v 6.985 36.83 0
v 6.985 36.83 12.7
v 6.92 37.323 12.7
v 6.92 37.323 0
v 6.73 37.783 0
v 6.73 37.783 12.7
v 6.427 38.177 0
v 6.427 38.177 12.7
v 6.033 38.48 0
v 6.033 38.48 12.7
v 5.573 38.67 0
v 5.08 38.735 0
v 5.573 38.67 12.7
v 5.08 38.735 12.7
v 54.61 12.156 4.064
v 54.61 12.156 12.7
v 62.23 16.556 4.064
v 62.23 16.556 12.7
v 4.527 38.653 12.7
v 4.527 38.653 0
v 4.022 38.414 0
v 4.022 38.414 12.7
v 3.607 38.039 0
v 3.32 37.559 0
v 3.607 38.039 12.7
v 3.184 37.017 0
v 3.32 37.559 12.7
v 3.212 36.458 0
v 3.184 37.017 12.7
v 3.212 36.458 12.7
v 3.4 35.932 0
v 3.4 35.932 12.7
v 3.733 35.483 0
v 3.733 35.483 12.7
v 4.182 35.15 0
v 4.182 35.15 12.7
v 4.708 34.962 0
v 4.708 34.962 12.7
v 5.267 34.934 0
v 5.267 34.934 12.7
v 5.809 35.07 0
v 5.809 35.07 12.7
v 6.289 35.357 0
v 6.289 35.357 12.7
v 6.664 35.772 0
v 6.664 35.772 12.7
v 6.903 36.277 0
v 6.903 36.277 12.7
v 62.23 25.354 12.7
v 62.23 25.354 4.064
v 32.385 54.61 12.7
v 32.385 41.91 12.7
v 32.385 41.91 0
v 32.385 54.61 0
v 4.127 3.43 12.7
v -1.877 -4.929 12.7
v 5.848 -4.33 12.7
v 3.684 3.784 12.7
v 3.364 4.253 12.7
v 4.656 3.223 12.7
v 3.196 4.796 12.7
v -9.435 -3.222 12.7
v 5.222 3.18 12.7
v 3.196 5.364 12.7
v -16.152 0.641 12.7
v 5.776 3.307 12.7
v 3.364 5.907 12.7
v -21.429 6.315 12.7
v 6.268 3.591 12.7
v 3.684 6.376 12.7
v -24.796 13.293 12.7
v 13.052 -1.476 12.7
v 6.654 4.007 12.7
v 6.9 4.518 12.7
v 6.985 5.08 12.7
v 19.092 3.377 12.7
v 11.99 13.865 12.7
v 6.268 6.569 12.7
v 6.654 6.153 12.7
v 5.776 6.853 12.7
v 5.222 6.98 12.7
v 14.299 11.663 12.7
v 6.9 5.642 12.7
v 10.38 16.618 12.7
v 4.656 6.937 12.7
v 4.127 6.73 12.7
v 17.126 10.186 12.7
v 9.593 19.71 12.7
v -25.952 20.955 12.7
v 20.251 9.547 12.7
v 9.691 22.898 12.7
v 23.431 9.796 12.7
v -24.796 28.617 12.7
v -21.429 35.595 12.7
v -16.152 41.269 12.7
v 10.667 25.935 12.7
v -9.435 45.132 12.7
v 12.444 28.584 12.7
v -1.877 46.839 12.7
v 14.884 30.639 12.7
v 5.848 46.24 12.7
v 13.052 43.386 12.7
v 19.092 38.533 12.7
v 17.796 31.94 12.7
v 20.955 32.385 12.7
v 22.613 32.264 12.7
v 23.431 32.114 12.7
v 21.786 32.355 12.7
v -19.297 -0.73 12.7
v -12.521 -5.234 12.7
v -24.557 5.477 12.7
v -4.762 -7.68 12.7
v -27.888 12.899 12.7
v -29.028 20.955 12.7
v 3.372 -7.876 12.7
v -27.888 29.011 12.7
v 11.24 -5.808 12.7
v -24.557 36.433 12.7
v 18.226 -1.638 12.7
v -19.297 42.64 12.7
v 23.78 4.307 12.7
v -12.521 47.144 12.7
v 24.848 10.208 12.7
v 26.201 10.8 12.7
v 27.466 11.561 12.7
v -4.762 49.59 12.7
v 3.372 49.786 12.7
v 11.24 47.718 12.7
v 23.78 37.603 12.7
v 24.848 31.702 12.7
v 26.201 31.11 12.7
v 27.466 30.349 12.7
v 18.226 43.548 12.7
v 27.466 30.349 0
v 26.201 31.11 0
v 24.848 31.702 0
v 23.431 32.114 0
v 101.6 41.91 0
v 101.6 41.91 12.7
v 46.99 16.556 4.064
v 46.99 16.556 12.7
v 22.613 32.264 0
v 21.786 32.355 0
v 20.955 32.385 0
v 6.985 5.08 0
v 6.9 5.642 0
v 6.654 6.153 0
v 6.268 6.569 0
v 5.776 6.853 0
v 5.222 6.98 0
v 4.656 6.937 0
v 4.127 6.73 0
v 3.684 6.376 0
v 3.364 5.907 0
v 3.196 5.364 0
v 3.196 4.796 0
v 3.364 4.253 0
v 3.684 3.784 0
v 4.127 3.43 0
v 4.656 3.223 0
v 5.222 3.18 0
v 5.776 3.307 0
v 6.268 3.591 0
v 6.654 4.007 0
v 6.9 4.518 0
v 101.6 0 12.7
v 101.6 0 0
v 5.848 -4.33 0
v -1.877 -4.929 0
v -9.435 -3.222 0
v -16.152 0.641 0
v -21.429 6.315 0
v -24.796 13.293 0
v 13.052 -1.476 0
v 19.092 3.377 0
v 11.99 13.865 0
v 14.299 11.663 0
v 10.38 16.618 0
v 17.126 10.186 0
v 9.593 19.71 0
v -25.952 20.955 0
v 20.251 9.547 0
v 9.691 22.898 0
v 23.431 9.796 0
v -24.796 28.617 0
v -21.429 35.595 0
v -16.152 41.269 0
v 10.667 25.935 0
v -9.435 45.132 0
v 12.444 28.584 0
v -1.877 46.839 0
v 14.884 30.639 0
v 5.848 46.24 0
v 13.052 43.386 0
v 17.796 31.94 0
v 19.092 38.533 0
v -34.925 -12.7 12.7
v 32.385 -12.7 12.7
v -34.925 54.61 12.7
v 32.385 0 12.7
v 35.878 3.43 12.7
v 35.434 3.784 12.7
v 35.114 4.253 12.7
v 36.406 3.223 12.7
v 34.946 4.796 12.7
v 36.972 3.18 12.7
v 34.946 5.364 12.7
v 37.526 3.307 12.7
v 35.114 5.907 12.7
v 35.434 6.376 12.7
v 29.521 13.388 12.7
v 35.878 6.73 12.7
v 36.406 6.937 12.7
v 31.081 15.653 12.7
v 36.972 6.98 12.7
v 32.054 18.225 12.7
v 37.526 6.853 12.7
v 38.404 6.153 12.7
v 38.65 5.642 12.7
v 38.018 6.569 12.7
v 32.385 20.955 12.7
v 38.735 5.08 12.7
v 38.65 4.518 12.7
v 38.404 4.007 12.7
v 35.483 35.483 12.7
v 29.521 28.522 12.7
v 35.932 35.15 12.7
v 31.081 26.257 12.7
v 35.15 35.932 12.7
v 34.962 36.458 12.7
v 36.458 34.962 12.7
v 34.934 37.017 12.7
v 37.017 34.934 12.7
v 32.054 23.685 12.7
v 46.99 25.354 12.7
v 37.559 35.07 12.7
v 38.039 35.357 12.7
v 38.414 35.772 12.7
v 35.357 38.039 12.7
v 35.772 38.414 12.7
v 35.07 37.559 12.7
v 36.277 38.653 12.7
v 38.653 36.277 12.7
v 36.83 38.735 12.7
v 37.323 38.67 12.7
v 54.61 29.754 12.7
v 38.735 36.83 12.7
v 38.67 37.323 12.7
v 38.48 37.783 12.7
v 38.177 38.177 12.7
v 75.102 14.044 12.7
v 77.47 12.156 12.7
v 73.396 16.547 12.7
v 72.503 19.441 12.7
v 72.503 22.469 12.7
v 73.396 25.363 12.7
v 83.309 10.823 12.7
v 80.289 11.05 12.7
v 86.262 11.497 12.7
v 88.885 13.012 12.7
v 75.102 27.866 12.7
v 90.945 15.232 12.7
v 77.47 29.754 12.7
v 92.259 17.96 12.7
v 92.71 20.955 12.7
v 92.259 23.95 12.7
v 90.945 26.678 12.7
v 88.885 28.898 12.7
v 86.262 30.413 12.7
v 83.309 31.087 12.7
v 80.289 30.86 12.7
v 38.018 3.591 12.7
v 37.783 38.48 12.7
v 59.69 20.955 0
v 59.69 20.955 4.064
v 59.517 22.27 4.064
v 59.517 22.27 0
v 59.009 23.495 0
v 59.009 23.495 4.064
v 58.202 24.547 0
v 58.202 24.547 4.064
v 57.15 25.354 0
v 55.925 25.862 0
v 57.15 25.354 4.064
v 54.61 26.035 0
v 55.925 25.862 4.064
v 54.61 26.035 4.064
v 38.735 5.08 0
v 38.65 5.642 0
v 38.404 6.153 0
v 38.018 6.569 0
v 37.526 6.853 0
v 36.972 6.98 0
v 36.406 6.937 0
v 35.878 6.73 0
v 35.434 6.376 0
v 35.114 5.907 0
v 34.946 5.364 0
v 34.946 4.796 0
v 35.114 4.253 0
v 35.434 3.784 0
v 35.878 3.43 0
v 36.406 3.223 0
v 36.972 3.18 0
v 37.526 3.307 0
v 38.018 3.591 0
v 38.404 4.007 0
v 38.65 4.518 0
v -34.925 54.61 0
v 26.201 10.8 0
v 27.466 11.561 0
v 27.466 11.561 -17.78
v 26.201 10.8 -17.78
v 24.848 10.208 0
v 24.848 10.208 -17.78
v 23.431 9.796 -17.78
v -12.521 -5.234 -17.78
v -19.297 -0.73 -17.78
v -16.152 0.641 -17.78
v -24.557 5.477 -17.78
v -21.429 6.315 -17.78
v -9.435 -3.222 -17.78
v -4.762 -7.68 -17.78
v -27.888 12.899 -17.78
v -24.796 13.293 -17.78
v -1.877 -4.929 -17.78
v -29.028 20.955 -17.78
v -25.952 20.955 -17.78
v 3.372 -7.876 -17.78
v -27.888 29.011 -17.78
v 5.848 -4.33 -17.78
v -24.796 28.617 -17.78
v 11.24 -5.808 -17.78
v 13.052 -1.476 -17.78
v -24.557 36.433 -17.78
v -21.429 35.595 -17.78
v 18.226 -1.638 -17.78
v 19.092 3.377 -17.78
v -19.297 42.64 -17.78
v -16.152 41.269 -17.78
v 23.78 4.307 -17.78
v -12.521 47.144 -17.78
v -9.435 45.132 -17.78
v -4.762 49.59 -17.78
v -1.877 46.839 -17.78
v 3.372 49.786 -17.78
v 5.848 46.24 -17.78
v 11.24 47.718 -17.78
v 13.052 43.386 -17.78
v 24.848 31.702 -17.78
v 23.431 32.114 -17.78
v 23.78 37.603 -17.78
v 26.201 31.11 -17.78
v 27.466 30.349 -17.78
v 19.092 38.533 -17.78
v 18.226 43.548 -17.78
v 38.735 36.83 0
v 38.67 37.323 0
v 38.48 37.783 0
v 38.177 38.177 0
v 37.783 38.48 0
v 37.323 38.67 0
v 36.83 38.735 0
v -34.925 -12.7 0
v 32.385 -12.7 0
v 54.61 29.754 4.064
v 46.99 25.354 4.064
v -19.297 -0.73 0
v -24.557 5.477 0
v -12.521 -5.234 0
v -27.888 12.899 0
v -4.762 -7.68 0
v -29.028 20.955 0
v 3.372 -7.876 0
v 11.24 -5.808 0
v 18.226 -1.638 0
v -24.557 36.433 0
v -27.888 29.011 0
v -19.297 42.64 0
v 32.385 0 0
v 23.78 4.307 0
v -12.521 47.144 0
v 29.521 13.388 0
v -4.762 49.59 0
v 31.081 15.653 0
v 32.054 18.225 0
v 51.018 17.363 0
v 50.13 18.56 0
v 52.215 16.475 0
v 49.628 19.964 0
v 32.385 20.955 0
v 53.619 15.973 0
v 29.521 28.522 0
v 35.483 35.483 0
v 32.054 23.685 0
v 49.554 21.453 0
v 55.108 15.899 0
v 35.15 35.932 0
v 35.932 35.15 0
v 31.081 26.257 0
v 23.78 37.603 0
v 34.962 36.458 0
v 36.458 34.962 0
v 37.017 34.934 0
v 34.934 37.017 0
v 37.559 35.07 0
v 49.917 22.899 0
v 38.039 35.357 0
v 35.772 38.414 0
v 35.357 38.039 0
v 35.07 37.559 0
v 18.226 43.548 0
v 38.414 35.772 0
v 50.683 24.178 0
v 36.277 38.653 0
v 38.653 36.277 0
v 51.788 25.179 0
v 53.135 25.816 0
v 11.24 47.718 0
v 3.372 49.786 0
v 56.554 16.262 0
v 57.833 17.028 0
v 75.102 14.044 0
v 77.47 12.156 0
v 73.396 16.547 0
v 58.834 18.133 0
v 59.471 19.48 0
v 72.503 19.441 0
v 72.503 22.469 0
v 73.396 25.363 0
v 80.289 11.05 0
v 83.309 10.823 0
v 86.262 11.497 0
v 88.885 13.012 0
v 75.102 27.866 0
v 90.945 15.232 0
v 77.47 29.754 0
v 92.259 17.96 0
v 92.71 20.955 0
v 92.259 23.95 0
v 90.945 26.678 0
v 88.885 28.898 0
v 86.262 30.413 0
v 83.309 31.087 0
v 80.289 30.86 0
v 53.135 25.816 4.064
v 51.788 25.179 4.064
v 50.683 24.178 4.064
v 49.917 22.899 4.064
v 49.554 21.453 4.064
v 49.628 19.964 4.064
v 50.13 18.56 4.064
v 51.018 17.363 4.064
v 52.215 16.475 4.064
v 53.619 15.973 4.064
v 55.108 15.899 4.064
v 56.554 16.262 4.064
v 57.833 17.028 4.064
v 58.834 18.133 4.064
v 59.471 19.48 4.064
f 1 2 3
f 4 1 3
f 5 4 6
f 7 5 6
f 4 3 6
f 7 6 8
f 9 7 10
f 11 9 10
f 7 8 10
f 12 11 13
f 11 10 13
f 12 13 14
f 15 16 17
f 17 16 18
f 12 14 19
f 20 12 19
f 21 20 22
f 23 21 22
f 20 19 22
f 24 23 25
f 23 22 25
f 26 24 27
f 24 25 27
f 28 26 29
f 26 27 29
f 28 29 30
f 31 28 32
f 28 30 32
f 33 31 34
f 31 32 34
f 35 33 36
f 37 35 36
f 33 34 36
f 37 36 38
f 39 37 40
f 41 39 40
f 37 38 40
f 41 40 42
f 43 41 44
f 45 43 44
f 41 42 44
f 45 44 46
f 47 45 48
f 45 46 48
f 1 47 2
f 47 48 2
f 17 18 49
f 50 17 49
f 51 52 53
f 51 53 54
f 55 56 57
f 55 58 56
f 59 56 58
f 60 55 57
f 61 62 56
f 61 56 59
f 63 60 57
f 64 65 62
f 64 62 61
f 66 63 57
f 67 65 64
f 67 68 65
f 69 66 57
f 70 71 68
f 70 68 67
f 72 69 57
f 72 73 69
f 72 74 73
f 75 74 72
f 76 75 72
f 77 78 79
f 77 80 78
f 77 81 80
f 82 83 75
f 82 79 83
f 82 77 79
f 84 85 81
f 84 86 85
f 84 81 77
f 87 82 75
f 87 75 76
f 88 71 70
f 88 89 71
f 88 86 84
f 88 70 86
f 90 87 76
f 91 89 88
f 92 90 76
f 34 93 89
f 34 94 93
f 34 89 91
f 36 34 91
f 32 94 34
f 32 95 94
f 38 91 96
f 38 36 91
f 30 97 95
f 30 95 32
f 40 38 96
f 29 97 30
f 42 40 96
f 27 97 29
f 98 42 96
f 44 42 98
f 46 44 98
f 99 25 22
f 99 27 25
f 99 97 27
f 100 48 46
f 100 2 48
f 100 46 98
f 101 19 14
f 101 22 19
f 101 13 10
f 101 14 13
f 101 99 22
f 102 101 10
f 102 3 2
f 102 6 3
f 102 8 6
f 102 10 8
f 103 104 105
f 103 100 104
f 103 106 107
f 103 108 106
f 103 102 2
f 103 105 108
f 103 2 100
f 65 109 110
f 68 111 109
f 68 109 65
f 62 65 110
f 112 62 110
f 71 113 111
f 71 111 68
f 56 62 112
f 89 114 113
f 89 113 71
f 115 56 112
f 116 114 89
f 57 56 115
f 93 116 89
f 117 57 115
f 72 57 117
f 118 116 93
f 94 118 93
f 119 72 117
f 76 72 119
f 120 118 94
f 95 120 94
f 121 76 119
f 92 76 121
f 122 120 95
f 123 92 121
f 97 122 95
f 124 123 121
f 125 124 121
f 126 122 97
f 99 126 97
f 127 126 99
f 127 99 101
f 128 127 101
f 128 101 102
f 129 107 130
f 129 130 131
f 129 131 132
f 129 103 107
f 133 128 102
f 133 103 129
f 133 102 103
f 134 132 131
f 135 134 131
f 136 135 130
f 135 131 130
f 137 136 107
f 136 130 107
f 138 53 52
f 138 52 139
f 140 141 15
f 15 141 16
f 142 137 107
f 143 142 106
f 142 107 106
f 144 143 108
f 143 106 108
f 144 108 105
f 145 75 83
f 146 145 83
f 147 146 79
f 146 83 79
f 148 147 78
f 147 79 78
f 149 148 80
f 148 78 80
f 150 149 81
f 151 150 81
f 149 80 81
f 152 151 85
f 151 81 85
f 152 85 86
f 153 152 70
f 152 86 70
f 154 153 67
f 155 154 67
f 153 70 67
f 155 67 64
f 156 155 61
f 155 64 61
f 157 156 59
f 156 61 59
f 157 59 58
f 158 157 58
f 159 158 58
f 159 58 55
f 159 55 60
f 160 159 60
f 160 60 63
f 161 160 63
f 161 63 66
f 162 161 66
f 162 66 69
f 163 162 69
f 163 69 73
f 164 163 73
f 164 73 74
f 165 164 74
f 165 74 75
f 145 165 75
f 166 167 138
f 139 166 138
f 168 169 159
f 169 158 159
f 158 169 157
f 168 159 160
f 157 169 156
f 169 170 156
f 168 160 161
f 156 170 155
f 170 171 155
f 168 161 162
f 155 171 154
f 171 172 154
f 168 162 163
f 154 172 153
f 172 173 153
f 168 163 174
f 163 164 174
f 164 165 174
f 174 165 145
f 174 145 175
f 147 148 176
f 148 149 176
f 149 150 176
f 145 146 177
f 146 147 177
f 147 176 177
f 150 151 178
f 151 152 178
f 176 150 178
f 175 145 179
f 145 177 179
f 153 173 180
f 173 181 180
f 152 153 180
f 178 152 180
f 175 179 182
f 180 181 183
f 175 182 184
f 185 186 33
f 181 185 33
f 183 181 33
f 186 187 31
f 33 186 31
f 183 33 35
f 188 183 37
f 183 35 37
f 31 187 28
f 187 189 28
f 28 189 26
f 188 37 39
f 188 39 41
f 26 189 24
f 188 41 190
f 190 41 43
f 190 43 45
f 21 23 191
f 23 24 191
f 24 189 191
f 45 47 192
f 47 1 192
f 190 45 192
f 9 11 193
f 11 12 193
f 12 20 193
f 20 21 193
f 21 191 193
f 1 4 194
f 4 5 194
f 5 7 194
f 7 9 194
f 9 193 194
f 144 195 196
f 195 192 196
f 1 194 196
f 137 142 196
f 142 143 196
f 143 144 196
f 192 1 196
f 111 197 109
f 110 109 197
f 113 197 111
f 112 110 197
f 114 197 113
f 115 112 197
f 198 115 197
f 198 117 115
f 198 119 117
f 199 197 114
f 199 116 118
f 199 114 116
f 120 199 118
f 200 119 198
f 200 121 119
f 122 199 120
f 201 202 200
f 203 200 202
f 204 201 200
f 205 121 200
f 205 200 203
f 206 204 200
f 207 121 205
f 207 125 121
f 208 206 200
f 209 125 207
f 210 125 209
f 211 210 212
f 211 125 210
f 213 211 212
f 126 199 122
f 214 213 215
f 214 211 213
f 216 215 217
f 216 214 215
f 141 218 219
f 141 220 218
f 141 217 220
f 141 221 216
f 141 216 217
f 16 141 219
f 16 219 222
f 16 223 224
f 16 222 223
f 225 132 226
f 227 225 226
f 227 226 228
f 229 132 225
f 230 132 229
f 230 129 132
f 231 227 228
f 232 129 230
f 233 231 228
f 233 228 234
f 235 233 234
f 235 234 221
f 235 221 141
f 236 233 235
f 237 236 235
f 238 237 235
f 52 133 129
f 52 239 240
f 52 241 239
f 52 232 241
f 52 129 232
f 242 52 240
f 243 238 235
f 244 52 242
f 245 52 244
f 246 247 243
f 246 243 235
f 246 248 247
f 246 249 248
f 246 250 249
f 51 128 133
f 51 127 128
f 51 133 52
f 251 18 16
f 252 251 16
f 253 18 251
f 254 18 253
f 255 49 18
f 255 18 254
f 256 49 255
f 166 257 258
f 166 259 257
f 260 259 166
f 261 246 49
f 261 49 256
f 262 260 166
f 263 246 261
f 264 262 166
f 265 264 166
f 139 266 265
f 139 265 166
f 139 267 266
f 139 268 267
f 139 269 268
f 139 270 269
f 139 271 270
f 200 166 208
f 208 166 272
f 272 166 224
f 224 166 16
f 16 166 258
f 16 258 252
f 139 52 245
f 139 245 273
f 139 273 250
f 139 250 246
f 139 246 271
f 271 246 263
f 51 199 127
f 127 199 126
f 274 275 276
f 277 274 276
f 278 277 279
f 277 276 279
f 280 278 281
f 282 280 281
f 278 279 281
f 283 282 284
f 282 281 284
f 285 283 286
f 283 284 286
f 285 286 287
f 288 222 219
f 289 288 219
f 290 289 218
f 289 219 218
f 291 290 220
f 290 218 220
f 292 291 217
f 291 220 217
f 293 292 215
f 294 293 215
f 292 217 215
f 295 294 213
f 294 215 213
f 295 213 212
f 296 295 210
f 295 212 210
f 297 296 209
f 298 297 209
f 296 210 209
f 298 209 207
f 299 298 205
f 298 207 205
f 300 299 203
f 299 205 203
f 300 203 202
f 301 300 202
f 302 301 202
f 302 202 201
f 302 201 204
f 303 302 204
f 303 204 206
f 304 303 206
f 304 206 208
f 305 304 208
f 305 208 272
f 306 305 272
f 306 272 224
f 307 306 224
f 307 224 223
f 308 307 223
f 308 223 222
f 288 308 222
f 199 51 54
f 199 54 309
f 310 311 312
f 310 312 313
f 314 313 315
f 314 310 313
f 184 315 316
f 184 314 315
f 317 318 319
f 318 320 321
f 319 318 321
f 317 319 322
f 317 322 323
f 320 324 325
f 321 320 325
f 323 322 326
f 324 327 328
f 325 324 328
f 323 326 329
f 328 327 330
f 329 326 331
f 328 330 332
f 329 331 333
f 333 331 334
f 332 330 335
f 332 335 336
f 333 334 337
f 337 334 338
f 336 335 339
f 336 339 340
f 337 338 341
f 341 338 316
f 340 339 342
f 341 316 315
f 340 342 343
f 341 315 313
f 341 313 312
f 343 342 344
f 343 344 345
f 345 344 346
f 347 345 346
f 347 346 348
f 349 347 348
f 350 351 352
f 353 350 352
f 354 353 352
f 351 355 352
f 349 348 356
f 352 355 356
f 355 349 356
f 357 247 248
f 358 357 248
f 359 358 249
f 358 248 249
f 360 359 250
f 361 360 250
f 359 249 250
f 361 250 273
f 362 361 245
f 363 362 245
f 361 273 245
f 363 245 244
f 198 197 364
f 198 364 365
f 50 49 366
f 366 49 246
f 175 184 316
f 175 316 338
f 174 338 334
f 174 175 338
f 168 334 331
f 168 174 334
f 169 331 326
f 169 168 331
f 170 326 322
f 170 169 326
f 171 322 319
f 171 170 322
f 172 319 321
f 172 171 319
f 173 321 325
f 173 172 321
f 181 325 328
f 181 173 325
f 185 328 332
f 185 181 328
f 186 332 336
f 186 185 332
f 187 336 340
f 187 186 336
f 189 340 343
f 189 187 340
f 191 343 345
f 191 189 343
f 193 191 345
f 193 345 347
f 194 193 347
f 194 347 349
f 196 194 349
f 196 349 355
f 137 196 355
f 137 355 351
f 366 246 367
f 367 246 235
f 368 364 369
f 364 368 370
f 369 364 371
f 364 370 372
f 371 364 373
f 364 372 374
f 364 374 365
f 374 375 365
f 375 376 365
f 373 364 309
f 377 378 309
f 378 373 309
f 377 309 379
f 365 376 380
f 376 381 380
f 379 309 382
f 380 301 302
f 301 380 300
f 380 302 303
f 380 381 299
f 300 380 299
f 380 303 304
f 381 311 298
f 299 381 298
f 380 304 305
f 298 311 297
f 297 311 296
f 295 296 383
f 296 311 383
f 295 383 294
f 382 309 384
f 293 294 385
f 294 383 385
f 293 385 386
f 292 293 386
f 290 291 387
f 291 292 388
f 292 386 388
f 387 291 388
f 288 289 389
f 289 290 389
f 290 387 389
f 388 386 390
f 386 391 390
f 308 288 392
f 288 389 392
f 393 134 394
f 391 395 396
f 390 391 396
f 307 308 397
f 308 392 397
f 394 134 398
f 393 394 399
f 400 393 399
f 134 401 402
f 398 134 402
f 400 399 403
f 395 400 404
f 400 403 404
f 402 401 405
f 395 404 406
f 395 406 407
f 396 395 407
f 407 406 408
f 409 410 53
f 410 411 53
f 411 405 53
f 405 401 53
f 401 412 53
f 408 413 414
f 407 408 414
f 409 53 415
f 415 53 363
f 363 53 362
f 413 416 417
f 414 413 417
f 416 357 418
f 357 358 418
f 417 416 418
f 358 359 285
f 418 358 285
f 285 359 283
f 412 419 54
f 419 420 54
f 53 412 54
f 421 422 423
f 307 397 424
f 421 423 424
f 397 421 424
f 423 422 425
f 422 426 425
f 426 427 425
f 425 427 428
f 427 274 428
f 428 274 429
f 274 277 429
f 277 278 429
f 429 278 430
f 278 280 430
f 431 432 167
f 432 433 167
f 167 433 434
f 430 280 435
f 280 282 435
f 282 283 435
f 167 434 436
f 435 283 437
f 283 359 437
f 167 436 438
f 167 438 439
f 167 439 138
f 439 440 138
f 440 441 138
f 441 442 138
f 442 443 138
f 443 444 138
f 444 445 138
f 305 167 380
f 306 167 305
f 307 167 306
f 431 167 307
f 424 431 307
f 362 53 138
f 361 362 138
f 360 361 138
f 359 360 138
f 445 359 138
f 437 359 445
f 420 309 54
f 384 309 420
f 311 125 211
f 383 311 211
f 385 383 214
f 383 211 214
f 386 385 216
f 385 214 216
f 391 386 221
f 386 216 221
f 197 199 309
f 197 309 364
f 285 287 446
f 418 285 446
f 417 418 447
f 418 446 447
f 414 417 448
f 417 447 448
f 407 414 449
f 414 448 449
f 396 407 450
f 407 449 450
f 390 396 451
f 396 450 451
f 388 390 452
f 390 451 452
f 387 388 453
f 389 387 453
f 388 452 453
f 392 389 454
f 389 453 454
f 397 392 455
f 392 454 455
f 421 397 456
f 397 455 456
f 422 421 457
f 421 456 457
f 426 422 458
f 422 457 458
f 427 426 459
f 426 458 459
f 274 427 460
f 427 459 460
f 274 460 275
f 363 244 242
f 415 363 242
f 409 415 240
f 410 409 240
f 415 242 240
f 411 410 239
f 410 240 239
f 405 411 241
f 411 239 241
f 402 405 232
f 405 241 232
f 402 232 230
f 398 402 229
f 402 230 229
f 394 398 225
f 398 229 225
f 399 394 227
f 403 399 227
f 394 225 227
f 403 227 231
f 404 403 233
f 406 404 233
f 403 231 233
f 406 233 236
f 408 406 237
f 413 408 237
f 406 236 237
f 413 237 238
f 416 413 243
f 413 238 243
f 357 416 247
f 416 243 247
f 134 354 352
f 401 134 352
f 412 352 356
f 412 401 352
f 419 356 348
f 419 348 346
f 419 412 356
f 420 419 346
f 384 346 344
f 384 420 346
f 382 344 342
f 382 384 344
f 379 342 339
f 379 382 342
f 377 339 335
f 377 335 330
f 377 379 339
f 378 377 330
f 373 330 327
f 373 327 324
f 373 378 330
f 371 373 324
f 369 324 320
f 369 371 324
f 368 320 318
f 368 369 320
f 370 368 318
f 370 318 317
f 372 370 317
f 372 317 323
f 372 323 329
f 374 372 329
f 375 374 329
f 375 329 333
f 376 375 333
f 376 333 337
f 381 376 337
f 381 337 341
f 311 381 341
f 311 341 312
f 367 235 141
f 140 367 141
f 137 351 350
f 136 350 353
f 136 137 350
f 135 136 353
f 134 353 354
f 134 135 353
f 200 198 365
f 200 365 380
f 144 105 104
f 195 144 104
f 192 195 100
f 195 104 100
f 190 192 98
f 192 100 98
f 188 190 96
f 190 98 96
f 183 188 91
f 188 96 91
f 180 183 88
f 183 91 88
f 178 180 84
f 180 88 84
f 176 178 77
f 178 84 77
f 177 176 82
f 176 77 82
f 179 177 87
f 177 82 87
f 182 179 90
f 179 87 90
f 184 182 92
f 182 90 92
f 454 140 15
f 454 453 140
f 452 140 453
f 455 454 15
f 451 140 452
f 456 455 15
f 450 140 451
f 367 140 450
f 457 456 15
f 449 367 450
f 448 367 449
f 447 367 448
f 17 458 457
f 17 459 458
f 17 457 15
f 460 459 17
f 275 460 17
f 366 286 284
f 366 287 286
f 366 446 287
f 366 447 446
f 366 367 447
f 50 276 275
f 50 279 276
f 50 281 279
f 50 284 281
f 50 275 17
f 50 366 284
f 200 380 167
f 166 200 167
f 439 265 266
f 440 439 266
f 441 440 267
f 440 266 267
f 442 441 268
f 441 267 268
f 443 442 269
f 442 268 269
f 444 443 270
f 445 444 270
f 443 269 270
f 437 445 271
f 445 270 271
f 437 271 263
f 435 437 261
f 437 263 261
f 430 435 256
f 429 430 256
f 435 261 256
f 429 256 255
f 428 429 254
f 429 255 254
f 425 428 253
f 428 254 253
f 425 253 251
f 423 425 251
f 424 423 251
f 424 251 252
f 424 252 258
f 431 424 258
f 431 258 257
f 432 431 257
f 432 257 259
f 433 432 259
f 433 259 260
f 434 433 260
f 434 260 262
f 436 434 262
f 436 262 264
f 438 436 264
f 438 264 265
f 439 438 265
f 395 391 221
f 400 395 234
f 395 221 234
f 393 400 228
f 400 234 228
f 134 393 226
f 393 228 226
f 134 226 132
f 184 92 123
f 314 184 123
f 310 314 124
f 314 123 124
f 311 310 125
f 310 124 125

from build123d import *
from build123d import SkipClean  # not in build123d's __all__

# Parameters (mm, degrees)
F0_W      = 101.6
F0_H      = 41.91
F1_DEPTH  = 12.7
F4_DEPTH  = 12.701
F5_R      = 5.08
F6_DEPTH  = 8.636
F7_R      = 10.16
F8_DEPTH  = 12.701
F10_DEPTH = 12.701
F2_R      = 1.905
F12_DEPTH = 25.4
F13_DEPTH = 12.7
F15_DEPTH = 30.48


with BuildPart() as f1:
    # F0 (on Top) → F1 (new body)
    with BuildSketch(Plane.XY):
        with Locations((50.8, 20.955)):
            Rectangle(F0_W, F0_H)
    extrude(amount=F1_DEPTH)

    # F3 (on face) → F4 (cut, through all)
    with BuildSketch(Plane.XY.offset(12.7)):
        with BuildLine():
            ThreePointArc((59.69, 20.955), (58.2021024484, 24.5471024484), (54.61, 26.035))
            ThreePointArc((54.61, 26.035), (51.0178975516, 17.3628975516), (59.69, 20.955))
        make_face()
    extrude(amount=-F4_DEPTH, mode=Mode.SUBTRACT)

    # F5 (on face) → F6 (cut)
    with BuildSketch(Plane.XY.offset(12.7)):
        Polygon((62.23, 16.5555909488), (62.23, 20.955), (62.23, 25.3544090512), (54.61, 29.7538181024), (46.99, 25.3544090512), (46.99, 16.5555909488), (54.61, 12.1561818976), align=None)
        with Locations((54.61, 20.955)):
            Circle(F5_R, mode=Mode.SUBTRACT)
    extrude(amount=-F6_DEPTH, mode=Mode.SUBTRACT)

    # F7 (on face) → F8 (cut, through all)
    with BuildSketch(Plane.XY.offset(12.7)):
        with Locations((82.55, 20.955)):
            Circle(F7_R)
    extrude(amount=-F8_DEPTH, mode=Mode.SUBTRACT)

    # F9 (on face) → F10 (cut, through all)
    with BuildSketch(Plane.XY.offset(12.7)):
        with BuildLine():
            ThreePointArc((20.955, 32.385), (12.872769491, 12.872769491), (32.385, 20.955))
            ThreePointArc((32.385, 20.955), (29.037230509, 29.037230509), (20.955, 32.385))
        make_face()
    extrude(amount=-F10_DEPTH, mode=Mode.SUBTRACT)

    # F2 (on face) → F12 (cut)
    with BuildSketch(Plane.XY.offset(12.7)):
        with BuildLine():
            ThreePointArc((38.735, 36.83), (38.1770384182, 38.1770384182), (36.83, 38.735))
            ThreePointArc((36.83, 38.735), (35.4829615818, 35.4829615818), (38.735, 36.83))
        make_face()
        with Locations((5.08, 5.08)):
            Circle(F2_R)
        with BuildLine():
            ThreePointArc((6.985, 36.83), (6.4270384182, 38.1770384182), (5.08, 38.735))
            ThreePointArc((5.08, 38.735), (3.7329615818, 35.4829615818), (6.985, 36.83))
        make_face()
        with Locations((36.83, 5.08)):
            Circle(F2_R)
    extrude(amount=-F12_DEPTH, mode=Mode.SUBTRACT)

    # F11 (on face) → F13 (join)
    with BuildSketch(Plane.XY.offset(12.7)):
        Polygon((32.385, -12.7), (32.385, 0), (0, 0), (0, 41.91), (32.385, 41.91), (32.385, 54.61), (-34.925, 54.61), (-34.925, -12.7), align=None)
    extrude(amount=-F13_DEPTH)

    # F14 (on face) → F15 (join)
    with BuildSketch(Plane.XY.offset(12.7)):
        with BuildLine():
            ThreePointArc((23.4308703665, 32.1136274213), (25.5340365405, 31.4276942265), (27.4656771106, 30.3494655815))
            ThreePointArc((27.4656771106, 30.3494655815), (-29.0279073084, 20.955), (27.4656771106, 11.5605344185))
            ThreePointArc((27.4656771106, 11.5605344185), (25.5340365405, 10.4823057735), (23.4308703665, 9.7963725787))
            ThreePointArc((23.4308703665, 9.7963725787), (-25.9522764331, 20.955), (23.4308703665, 32.1136274213))
        make_face()
    with SkipClean():  # cleaning this boolean's faces spoils the solid; the shape is the same uncleaned
        extrude(amount=-F15_DEPTH)


solid = f1.part
